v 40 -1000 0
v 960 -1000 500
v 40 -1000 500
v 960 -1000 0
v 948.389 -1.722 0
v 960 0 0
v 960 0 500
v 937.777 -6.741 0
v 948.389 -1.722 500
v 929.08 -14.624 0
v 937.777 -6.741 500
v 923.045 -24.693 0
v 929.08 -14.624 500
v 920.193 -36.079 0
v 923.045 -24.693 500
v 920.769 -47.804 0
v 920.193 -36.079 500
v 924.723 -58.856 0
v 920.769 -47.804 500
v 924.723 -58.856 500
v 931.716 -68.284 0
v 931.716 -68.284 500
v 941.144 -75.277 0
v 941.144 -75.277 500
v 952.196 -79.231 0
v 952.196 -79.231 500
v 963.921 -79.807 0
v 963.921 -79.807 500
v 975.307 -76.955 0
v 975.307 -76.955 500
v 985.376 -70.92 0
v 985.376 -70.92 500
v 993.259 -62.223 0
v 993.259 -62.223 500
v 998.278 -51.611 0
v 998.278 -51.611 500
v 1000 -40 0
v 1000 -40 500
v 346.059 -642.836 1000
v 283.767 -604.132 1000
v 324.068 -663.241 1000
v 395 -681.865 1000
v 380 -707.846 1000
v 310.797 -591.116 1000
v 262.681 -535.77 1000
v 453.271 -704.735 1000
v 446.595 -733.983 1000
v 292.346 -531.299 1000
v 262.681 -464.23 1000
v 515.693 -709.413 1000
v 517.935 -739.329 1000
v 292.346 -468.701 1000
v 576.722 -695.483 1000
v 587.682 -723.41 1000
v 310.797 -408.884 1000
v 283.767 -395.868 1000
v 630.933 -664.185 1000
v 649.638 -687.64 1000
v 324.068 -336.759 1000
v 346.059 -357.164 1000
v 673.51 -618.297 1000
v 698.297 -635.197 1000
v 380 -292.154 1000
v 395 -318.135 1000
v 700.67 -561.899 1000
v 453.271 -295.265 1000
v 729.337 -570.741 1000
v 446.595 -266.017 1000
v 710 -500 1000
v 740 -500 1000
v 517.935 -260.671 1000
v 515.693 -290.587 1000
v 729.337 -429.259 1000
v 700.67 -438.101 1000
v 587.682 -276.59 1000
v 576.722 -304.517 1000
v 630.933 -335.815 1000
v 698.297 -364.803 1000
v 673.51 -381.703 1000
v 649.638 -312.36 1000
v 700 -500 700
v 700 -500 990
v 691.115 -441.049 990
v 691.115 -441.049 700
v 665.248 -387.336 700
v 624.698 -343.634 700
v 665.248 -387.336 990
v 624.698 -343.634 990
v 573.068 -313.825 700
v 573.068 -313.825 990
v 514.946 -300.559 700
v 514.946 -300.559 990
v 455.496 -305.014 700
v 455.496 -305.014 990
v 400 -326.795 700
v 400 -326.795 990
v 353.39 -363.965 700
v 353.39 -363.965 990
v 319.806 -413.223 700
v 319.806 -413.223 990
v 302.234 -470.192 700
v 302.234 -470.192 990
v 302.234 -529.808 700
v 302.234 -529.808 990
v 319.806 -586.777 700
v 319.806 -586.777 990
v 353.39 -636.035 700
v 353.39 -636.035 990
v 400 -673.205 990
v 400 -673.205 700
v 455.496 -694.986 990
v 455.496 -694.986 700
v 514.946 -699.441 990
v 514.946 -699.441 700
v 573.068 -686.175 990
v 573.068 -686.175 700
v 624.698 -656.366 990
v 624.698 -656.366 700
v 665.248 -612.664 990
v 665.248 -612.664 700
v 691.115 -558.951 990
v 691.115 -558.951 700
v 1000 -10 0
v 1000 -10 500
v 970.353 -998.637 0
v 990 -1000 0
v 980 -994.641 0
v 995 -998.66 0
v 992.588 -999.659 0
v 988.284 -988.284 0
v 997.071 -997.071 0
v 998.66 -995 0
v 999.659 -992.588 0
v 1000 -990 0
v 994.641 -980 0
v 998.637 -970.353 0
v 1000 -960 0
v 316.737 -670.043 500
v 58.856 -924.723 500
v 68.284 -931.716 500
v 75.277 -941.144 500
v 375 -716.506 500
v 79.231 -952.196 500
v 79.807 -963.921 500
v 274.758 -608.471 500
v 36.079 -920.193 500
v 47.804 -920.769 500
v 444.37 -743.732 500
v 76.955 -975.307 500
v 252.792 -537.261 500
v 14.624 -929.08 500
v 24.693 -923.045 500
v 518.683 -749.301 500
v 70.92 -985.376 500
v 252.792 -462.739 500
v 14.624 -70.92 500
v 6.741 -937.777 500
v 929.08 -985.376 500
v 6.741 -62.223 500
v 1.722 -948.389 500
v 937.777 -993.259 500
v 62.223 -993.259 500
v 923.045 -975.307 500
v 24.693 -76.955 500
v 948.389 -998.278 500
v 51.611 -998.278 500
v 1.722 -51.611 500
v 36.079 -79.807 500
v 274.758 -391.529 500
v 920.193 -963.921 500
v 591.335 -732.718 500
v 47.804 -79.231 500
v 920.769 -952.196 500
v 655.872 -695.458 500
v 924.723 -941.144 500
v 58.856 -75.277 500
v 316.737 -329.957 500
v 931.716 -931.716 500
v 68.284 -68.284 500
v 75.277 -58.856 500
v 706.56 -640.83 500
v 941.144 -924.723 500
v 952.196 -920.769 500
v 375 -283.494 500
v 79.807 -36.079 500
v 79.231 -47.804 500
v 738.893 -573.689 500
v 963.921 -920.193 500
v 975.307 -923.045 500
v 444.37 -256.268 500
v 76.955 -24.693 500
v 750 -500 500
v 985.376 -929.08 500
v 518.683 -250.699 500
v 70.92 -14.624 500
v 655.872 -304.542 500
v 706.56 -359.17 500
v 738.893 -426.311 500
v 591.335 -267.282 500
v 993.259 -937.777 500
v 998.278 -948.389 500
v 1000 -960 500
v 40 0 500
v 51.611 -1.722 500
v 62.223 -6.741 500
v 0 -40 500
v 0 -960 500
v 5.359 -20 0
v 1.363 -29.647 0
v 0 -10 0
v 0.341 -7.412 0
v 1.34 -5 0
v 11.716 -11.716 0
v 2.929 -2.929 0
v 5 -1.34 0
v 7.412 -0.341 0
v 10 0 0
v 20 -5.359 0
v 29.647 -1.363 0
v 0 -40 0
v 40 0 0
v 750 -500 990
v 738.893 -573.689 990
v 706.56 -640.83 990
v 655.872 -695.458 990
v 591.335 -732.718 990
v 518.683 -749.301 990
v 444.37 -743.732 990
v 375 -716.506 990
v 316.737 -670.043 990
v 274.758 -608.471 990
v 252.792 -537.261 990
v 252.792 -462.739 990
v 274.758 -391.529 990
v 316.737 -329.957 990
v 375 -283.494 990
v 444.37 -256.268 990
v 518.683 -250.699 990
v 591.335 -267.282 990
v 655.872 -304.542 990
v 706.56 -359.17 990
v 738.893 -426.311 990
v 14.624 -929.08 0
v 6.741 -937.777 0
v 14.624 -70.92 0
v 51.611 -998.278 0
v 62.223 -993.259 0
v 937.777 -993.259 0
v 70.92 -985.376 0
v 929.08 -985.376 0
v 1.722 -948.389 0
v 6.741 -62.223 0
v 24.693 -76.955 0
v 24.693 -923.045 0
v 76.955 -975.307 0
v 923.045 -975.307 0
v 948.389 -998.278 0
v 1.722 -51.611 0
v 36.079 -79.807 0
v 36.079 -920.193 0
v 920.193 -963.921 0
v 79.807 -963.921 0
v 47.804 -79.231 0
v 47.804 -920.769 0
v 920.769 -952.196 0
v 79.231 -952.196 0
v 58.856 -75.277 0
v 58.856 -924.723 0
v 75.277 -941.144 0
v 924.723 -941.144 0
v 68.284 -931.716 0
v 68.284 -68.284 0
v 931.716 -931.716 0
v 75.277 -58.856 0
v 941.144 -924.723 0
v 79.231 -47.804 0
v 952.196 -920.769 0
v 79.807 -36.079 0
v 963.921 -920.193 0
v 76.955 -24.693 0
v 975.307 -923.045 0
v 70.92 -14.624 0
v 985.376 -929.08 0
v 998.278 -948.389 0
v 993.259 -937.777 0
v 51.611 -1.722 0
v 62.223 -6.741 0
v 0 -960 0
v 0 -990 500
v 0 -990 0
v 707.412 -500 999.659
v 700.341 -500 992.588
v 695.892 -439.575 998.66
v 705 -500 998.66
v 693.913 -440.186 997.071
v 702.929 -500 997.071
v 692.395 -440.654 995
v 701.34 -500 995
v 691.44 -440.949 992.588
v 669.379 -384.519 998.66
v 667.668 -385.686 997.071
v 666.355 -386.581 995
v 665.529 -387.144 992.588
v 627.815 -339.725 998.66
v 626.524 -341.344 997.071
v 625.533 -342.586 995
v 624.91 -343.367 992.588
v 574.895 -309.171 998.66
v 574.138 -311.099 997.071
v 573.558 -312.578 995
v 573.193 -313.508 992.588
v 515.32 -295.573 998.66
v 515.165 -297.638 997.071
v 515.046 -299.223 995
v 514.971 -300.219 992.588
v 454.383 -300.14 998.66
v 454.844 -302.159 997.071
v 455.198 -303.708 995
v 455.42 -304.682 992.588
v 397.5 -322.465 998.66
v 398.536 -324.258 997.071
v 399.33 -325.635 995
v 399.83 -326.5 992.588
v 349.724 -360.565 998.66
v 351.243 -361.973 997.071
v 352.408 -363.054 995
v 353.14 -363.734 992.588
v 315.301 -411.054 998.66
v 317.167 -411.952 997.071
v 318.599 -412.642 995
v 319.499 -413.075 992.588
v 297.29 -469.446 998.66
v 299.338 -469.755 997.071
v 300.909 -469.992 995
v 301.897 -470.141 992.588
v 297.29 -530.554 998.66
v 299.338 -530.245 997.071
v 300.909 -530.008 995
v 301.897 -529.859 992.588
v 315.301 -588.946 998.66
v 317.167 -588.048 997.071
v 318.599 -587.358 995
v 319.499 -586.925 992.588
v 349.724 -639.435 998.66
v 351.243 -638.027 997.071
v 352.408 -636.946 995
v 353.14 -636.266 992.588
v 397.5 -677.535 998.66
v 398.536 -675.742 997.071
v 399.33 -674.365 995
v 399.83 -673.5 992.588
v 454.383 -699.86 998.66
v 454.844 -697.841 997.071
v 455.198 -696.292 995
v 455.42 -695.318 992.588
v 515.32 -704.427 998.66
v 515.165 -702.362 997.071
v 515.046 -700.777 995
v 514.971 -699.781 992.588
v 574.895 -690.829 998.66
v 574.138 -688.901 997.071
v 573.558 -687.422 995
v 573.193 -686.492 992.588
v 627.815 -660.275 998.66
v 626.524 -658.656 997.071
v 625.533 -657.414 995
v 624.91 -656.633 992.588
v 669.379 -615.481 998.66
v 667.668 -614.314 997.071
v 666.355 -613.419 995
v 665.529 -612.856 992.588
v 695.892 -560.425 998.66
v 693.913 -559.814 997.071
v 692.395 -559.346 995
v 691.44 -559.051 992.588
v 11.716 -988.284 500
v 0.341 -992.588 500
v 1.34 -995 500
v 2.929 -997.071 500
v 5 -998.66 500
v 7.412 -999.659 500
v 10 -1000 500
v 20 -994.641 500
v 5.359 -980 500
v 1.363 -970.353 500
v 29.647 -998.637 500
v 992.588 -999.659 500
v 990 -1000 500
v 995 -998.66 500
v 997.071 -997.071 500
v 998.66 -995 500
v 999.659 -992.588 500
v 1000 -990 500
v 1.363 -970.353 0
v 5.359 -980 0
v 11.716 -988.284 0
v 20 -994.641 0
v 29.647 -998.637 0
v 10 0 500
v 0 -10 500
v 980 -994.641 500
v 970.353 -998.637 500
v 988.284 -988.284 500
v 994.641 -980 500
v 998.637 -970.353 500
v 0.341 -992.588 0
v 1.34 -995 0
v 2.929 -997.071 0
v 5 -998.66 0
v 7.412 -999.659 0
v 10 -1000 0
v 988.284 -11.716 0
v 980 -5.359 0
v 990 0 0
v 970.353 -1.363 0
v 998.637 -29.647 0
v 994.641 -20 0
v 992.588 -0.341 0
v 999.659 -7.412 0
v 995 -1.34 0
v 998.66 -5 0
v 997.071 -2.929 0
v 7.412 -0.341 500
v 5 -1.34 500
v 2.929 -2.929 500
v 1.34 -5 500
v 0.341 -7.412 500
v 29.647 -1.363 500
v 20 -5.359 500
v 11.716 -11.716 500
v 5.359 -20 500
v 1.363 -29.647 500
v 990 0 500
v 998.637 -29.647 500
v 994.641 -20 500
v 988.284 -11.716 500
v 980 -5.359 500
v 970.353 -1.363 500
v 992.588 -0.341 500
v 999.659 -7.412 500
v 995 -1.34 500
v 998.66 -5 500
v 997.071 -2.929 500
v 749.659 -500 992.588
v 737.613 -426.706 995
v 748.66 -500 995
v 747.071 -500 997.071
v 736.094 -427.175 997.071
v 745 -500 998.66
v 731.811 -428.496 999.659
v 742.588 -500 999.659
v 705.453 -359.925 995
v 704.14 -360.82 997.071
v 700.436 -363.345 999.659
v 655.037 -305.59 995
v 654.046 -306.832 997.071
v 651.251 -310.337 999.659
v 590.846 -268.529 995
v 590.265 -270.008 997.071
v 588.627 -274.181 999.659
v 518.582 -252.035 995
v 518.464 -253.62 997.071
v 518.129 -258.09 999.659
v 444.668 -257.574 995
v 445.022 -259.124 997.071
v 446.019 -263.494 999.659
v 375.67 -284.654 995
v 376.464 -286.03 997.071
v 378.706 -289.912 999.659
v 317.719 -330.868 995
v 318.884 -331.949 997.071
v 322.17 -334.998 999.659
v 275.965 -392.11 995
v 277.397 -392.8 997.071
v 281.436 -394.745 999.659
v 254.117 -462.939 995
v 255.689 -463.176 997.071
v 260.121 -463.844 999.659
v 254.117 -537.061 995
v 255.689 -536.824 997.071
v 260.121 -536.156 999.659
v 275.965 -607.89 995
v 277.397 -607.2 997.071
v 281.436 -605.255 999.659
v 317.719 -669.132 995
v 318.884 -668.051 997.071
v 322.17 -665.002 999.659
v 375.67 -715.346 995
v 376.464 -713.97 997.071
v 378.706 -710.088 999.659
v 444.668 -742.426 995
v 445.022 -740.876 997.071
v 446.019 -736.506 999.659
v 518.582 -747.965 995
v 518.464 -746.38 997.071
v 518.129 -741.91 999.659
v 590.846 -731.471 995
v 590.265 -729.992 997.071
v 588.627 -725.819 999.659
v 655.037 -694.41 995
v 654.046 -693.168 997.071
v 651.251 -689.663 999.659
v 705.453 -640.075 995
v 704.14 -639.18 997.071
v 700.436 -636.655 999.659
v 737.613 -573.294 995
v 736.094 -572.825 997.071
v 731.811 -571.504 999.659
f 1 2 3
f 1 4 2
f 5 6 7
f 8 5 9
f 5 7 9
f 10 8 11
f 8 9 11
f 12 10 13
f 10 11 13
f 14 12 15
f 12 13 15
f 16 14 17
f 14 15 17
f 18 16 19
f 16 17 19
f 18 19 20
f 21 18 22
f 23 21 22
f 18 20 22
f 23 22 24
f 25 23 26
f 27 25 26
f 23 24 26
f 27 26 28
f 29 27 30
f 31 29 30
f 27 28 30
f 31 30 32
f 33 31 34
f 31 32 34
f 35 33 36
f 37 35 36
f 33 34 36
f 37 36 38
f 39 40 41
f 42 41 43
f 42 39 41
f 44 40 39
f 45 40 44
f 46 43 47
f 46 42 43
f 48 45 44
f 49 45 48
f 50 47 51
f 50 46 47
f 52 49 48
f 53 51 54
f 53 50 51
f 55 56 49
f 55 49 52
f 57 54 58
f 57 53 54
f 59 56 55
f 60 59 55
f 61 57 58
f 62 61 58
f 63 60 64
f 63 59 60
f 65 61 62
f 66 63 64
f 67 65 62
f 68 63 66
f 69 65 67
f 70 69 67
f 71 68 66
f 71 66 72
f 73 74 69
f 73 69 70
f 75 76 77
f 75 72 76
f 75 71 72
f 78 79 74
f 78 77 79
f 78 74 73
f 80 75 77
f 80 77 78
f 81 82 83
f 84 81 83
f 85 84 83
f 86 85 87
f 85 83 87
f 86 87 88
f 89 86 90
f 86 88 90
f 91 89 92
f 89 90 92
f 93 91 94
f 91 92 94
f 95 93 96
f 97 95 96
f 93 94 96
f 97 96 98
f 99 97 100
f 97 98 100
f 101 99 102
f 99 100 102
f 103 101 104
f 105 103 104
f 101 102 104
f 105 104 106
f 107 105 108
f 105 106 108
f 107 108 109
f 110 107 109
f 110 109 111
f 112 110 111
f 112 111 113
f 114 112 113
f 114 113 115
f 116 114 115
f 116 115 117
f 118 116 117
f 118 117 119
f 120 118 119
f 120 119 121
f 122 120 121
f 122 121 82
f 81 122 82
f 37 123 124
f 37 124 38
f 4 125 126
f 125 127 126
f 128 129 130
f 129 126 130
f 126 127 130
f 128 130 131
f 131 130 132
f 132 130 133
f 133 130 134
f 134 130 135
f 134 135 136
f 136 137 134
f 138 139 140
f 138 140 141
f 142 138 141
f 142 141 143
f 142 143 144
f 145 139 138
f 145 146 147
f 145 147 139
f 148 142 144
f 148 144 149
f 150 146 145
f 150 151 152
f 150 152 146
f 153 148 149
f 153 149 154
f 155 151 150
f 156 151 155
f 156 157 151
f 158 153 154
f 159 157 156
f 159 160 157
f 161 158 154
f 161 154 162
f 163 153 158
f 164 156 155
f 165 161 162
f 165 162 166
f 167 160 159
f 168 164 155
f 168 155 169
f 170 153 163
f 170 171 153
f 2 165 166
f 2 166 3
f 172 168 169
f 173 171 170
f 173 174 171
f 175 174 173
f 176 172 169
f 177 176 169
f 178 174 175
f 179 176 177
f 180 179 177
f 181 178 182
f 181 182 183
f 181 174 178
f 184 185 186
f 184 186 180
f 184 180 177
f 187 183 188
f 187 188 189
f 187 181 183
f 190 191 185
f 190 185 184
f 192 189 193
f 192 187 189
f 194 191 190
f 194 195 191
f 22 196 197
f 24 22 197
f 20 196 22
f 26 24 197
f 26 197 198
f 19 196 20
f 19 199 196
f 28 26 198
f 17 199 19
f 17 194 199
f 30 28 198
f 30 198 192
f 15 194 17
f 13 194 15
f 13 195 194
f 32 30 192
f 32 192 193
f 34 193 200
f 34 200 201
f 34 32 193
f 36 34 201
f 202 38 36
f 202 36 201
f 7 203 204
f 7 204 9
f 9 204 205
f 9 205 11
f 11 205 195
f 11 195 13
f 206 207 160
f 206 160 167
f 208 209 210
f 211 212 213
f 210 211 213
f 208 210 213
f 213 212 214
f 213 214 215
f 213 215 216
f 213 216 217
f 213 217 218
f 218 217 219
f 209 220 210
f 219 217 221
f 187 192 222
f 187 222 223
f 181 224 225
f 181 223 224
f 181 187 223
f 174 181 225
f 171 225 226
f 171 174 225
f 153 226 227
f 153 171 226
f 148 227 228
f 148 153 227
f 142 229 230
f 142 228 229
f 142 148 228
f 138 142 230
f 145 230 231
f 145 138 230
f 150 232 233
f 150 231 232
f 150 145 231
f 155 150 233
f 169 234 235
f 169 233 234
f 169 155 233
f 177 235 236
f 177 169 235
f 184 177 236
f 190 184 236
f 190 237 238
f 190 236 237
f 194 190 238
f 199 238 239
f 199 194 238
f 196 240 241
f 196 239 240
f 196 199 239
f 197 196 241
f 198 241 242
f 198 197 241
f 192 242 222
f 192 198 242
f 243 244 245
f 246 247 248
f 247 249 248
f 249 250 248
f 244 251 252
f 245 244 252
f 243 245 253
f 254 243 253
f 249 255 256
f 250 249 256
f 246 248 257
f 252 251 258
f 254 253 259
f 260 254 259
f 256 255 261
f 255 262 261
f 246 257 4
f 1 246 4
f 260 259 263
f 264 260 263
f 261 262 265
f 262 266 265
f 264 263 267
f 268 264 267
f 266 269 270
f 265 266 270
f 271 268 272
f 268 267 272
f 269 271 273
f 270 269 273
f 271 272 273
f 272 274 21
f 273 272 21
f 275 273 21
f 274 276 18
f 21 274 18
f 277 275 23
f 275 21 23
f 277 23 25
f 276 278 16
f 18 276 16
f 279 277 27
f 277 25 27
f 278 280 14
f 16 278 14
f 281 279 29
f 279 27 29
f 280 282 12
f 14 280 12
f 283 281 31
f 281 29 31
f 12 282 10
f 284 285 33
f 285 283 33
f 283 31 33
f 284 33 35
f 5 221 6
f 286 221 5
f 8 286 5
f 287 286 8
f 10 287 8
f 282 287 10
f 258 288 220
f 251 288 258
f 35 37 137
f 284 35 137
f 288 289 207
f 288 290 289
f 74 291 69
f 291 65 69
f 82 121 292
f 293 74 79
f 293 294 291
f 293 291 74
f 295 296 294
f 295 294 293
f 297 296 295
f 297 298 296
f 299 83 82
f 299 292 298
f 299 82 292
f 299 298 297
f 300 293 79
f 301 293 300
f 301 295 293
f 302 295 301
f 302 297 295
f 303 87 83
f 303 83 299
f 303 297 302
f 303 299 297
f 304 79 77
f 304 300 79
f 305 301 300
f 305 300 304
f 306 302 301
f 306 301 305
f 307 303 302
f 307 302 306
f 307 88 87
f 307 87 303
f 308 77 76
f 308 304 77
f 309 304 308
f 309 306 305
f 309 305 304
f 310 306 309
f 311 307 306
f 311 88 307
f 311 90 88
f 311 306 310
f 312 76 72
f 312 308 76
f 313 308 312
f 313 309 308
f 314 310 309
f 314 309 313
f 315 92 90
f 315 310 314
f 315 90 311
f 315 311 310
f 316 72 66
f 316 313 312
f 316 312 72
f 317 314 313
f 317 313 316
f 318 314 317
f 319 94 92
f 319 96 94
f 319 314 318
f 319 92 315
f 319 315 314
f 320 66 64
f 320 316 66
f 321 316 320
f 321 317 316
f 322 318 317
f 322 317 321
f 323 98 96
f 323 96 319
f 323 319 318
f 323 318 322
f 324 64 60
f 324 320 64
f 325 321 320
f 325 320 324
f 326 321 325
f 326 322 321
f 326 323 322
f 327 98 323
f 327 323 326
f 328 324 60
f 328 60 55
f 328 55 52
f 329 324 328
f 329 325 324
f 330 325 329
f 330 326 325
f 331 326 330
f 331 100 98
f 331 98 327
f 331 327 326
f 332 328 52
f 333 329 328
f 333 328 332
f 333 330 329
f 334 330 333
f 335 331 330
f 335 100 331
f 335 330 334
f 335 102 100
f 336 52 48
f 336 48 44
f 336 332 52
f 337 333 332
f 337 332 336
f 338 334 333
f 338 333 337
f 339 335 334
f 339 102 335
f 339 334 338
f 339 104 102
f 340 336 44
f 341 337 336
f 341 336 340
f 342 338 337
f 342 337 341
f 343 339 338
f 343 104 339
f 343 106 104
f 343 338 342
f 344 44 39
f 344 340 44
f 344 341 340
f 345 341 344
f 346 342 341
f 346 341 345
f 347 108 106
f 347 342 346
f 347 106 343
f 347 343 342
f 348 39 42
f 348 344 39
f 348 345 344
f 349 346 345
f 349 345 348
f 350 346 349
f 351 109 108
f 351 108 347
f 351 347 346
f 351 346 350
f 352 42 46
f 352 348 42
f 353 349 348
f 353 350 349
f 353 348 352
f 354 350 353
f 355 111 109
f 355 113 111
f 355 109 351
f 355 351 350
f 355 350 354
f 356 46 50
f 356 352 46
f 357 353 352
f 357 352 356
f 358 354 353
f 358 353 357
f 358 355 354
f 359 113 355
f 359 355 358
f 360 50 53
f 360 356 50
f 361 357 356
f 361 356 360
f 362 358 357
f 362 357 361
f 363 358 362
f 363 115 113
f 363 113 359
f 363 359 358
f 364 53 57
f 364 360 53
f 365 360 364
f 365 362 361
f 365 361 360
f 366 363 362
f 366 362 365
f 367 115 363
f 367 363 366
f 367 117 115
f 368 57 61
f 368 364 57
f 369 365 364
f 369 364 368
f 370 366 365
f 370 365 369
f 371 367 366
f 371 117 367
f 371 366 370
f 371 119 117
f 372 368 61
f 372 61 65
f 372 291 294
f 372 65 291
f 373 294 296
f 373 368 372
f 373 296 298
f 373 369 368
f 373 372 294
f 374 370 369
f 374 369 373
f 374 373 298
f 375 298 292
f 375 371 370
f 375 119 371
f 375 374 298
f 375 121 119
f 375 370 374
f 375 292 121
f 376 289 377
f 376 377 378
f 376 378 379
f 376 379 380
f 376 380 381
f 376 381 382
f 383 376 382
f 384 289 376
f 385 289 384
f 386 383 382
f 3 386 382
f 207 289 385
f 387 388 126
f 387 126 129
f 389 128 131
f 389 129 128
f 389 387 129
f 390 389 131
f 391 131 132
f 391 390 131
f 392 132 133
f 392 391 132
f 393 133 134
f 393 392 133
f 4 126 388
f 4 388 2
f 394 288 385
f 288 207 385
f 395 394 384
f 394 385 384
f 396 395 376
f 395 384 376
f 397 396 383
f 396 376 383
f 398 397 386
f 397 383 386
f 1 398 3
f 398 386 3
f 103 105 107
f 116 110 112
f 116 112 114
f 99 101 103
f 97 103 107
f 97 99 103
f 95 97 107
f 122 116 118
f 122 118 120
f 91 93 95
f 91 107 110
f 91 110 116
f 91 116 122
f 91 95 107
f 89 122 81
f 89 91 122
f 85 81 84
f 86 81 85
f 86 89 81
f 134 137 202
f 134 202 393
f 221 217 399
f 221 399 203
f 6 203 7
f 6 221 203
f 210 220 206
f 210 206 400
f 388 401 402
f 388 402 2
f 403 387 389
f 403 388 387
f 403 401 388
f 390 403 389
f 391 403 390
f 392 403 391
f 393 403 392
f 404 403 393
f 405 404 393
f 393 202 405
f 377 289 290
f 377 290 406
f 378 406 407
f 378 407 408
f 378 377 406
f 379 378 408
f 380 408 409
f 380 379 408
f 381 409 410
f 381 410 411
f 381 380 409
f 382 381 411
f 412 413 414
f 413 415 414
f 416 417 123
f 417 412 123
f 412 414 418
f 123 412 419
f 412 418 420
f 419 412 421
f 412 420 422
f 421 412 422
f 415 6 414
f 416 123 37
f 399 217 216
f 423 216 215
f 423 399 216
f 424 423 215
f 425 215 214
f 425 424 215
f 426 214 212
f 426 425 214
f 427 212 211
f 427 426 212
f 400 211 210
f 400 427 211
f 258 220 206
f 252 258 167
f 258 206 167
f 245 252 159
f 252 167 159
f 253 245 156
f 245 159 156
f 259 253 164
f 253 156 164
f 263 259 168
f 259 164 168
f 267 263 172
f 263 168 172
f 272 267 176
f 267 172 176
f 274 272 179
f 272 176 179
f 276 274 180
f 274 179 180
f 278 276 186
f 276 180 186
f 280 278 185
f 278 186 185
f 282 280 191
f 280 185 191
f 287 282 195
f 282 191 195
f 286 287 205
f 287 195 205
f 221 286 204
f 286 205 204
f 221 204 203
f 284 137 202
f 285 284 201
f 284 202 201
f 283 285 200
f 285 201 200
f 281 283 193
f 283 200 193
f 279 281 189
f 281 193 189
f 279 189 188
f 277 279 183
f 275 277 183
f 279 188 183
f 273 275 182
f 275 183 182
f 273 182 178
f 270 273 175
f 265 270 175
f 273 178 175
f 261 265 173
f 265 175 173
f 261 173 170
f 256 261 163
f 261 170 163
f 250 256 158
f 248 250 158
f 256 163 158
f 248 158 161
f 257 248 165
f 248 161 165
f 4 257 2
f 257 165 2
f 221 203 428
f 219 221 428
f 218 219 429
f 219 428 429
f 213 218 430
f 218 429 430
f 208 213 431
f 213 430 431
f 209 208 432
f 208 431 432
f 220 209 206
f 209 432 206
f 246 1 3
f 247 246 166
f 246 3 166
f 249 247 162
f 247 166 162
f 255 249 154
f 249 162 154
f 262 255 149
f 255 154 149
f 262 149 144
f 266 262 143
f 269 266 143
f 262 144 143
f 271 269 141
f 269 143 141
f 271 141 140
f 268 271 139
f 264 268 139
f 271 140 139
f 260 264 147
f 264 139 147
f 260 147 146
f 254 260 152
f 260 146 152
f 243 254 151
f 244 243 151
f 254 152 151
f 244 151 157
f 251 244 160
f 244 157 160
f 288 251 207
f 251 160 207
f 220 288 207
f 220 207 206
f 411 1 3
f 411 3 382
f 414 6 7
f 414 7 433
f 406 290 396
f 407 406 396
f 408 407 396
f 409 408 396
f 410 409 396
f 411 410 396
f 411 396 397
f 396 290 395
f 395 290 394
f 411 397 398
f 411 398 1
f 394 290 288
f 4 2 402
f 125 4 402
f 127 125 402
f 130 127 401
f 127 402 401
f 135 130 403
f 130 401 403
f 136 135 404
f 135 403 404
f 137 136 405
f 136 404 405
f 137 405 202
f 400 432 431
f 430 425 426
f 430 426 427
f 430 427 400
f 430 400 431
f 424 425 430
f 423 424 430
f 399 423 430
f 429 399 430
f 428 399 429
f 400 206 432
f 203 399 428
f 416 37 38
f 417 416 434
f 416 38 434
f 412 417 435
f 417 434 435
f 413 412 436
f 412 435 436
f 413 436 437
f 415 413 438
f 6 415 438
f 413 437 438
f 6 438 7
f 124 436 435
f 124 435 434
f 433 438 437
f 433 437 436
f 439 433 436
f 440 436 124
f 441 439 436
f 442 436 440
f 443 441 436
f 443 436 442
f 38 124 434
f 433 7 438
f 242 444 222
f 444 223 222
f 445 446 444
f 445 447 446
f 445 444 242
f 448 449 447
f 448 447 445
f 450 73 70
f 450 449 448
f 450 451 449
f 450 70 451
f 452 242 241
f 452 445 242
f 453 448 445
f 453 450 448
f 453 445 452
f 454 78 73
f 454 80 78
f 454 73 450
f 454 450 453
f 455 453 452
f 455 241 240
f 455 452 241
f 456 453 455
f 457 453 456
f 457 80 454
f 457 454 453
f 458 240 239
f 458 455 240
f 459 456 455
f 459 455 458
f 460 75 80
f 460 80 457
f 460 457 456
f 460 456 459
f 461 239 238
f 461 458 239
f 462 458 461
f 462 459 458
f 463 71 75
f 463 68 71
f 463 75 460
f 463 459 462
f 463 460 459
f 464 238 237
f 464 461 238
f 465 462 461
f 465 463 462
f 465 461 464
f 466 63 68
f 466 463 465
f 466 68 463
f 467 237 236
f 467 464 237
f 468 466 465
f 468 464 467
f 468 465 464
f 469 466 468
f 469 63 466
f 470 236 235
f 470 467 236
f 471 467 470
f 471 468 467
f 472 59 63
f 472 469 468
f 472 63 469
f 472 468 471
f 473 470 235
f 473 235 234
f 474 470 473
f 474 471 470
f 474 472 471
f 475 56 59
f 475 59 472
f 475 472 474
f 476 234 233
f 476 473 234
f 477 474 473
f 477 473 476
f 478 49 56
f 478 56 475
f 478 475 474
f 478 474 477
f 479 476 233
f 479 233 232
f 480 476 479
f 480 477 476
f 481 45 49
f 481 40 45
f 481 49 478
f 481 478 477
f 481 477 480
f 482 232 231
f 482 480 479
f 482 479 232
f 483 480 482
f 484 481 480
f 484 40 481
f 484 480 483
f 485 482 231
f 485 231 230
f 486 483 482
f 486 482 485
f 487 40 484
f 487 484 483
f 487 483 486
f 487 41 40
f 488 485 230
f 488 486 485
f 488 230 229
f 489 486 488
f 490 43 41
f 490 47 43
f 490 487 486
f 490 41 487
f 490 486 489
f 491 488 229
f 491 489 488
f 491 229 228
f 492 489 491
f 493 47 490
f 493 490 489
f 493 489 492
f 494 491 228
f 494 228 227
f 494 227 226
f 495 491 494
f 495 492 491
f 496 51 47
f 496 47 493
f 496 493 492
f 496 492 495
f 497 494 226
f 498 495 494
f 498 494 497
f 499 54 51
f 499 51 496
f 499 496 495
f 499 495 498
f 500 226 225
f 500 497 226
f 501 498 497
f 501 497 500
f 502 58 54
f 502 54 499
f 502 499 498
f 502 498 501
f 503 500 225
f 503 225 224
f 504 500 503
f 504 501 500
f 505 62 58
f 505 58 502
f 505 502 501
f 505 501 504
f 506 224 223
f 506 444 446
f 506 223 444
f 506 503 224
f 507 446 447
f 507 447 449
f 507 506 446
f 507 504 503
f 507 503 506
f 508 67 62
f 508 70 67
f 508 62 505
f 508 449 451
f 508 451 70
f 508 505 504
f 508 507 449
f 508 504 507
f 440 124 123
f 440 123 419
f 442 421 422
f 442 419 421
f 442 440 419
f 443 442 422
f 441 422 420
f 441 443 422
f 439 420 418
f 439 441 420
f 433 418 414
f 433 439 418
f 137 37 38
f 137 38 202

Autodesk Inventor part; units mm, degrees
ref_plane "YZ Plane" through (0, 0, 0) normal (1, 0, 0) x (0, 1, 0)
ref_plane "XZ Plane" through (0, 0, 0) normal (0, 1, 0) x (-1, 0, 0)
ref_plane "XY Plane" through (0, 0, 0) normal (0, 0, 1) x (1, 0, 0)
sketch "Sketch1" plane through (0, 0, 0) normal (0, 0, 1) x (1, 0, 0)
  line L0 (0, 0) -> (1000, 0)
  line L1 (1000, 0) -> (1000, -1000)
  line L2 (1000, -1000) -> (0, -1000)
  line L3 (0, -1000) -> (0, 0)
  dimension "d0" = 1000
  dimension "d1" = 1000
extrude "Extrusion1" add sketch "Sketch1" along normal blind 500
sketch "Sketch2" plane through (0, 0, 500) normal (0, 0, 1) x (1, 0, 0)
  line L0 (0, 0) -> (0, -1000) projected
  line L1 (0, -500) -> (1000, -500) construction
  line L2 (1000, -1000) -> (1000, 0) projected
  circle A0 centre (500, -500) radius 250
  dimension "d4" = 500
extrude "Extrusion2" add sketch "Sketch2" along normal blind 500
sketch "Sketch3" plane through (500, -500, 1000) normal (0, 0, 1) x (1, 0, 0)
  circle A0 centre (0, 0) radius 250 projected
  circle A1 centre (0, 0) radius 200
  point P0 (-500, 500)
  dimension "d7" = 400
extrude "Extrusion3" cut sketch "Sketch3" against normal blind 300 contours A1
fillet "Fillet1" radius 10 5 edges at (1000, 0, 250) (1000, -1000, 250) (0, 0, 250) (0, -1000, 250) (300, -500, 1000)
sketch "Sketch4" plane through (0, 0, 500) normal (0, 0, 1) x (1, 0, 0)
  line L0 (0, -10) -> (0, -990) projected
  line L1 (1000, -990) -> (1000, -10) projected
  line L2 (10, -1000) -> (990, -1000) projected
  line L3 (-34.7433, -960) -> (1071.285, -960) construction
  line L4 (960, -1052.4238) -> (960, 91.4593) construction
  line L5 (990, 0) -> (10, 0) projected
  circle A0 centre (960, -960) radius 40
  line L6 (1056.705, -40) -> (-70.4177, -40) construction
  line L7 (40, 72.2034) -> (40, -1093.9026) construction
  circle A1 centre (40, -960) radius 40
  circle A2 centre (40, -40) radius 40
  circle A3 centre (960, -40) radius 40
  point P0 (0, 0)
  point P1 (960, -1052.4238)
  point P2 (960, 91.4593)
  dimension "d12" = 40
  dimension "d13" = 40
  dimension "d14" = 80
  dimension "d15" = 40
  dimension "d16" = 40
  dimension "d17" = 80
  dimension "d18" = 80
  dimension "d19" = 80
extrude "Extrusion4" cut sketch "Sketch4" against normal blind 500 contours A2 | A1 | A3 | A0
fillet "Fillet2" radius 10 1 edges at (250, -500, 1000)
properties part number "Práctica 1"
